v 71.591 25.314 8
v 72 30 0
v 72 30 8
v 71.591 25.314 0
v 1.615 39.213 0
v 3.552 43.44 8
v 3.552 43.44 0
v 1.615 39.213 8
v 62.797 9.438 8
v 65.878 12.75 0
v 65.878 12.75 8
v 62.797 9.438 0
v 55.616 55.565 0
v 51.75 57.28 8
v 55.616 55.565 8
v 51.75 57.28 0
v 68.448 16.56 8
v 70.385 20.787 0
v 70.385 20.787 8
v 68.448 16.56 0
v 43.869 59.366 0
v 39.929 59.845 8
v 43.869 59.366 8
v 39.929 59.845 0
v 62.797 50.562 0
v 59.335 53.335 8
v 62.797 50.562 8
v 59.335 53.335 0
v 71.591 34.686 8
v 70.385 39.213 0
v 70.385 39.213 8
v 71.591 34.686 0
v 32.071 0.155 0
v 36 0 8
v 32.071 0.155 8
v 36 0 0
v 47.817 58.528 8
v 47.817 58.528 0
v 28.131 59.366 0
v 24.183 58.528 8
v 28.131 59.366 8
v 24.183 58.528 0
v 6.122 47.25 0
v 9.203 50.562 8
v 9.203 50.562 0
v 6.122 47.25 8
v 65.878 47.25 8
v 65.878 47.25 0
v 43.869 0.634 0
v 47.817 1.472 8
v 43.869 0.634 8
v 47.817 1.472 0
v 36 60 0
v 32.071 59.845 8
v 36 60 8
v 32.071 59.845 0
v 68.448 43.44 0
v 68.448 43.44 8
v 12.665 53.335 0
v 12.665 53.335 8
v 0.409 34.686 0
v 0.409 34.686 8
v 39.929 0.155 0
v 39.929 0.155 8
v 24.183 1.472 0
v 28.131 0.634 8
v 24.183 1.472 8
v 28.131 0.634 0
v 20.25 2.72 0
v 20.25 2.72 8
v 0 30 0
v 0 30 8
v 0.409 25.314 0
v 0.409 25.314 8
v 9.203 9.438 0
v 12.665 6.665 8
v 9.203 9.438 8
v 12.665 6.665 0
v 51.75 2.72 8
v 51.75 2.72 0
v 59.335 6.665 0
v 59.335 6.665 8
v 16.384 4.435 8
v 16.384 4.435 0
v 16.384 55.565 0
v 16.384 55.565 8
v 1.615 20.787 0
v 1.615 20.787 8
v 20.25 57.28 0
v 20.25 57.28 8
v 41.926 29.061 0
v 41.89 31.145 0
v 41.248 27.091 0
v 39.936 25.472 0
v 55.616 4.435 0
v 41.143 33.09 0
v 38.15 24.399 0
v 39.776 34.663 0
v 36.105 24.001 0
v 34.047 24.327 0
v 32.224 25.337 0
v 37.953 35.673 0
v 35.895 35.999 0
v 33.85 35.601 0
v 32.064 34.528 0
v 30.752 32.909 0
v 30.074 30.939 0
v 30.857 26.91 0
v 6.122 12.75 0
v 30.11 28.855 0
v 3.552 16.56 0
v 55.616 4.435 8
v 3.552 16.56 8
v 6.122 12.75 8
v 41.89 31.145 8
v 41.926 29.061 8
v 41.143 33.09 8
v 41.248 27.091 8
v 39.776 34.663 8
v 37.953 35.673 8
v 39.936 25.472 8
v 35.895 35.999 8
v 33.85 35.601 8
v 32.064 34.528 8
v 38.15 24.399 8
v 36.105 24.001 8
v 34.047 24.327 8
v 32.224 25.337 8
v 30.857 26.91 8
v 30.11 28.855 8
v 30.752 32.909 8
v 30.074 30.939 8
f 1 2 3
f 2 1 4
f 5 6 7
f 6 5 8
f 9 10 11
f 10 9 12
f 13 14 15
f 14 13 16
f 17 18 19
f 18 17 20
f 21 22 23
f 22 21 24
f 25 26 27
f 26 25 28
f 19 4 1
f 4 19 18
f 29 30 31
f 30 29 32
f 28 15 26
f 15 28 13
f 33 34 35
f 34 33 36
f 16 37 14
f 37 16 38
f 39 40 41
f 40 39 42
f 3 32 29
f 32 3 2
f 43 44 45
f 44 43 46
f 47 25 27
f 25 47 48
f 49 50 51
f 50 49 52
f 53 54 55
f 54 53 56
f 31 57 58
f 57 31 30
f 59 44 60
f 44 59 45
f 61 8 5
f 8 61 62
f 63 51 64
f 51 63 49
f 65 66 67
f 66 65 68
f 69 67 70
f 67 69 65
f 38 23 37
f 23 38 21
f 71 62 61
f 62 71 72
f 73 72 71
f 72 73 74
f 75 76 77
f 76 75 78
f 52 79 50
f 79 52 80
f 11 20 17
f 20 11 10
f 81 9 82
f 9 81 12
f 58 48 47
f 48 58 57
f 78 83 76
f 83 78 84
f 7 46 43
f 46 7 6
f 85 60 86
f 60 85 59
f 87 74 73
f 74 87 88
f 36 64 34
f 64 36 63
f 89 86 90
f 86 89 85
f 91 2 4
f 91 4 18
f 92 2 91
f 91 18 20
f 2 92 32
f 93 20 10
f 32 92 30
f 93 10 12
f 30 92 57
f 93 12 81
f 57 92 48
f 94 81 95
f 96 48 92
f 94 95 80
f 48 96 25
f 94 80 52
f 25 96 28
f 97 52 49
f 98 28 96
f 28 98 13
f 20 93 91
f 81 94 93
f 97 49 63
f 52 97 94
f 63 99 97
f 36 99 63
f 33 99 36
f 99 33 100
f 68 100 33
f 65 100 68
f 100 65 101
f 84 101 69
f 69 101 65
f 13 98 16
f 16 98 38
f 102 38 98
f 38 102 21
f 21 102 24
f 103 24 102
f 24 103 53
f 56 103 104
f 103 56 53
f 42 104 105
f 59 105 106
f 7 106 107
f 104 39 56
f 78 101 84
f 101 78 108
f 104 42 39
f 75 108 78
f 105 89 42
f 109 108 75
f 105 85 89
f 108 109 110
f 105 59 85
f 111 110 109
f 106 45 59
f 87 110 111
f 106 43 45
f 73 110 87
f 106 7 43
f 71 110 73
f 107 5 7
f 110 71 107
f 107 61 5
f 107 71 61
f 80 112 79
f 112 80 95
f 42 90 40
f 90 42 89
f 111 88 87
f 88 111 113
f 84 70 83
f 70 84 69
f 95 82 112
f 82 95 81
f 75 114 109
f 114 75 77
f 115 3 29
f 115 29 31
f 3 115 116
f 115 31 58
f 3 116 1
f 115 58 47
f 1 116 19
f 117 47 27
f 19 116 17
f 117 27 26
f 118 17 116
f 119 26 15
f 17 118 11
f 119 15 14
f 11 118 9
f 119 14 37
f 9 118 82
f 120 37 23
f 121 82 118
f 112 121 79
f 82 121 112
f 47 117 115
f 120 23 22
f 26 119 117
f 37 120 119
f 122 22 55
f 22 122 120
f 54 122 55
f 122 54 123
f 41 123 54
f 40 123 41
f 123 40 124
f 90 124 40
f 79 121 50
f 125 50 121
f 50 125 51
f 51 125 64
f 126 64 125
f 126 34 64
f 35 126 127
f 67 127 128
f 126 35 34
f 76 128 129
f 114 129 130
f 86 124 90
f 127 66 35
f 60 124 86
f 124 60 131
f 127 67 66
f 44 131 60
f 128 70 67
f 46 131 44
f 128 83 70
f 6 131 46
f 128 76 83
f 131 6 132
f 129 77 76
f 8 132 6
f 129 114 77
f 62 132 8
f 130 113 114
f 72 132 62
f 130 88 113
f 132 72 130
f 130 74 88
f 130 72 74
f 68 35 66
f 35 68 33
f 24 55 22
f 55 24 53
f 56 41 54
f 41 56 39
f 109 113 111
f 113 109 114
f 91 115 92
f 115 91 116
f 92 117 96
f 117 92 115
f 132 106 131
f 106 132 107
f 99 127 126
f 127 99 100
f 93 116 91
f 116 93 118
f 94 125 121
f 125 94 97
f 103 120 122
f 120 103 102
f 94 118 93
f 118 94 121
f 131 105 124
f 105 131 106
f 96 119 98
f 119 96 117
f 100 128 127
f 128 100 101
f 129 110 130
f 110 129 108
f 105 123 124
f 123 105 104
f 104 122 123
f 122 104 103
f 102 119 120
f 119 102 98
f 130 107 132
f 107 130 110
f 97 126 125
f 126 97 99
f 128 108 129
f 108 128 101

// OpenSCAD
$fn = 32;

// ----------------------------------------------------------------------
// Cam plate: double_lobe cam, base R28
// ----------------------------------------------------------------------

// --- parameters (mm) ---
base_r = 28;              // base circle radius
lobe_h = 8;               // cam lobe rise
bore_r = 6;               // shaft bore radius
plate_t = 8;              // plate thickness, Z (extrusion height)

profile = [[72, 30], [71.591, 34.686], [70.385, 39.213], [68.448, 43.44], [65.878, 47.25], [62.797, 50.562], [59.335, 53.335], [55.616, 55.565], [51.75, 57.28], [47.817, 58.528], [43.869, 59.366], [39.929, 59.845], [36, 60], [32.071, 59.845], [28.131, 59.366], [24.183, 58.528], [20.25, 57.28], [16.384, 55.565], [12.665, 53.335], [9.203, 50.562], [6.122, 47.25], [3.552, 43.44], [1.615, 39.213], [0.409, 34.686], [0, 30], [0.409, 25.314], [1.615, 20.787], [3.552, 16.56], [6.122, 12.75], [9.203, 9.438], [12.665, 6.665], [16.384, 4.435], [20.25, 2.72], [24.183, 1.472], [28.131, 0.634], [32.071, 0.155], [36, 0], [39.929, 0.155], [43.869, 0.634], [47.817, 1.472], [51.75, 2.72], [55.616, 4.435], [59.335, 6.665], [62.797, 9.438], [65.878, 12.75], [68.448, 16.56], [70.385, 20.787], [71.591, 25.314]];  // primary outline, 48 points, counter clockwise
void_1 = [[41.89, 31.145], [41.143, 33.09], [39.776, 34.663], [37.953, 35.673], [35.895, 35.999], [33.85, 35.601], [32.064, 34.528], [30.752, 32.909], [30.074, 30.939], [30.11, 28.855], [30.857, 26.91], [32.224, 25.337], [34.047, 24.327], [36.105, 24.001], [38.15, 24.399], [39.936, 25.472], [41.248, 27.091], [41.926, 29.061]];  // shaft bore, 18 points

// --- the one profile operation ---
difference() {
  linear_extrude(height = plate_t) polygon(points = profile);
  translate([0, 0, -1])
    linear_extrude(height = plate_t + 2) polygon(points = void_1);
}
